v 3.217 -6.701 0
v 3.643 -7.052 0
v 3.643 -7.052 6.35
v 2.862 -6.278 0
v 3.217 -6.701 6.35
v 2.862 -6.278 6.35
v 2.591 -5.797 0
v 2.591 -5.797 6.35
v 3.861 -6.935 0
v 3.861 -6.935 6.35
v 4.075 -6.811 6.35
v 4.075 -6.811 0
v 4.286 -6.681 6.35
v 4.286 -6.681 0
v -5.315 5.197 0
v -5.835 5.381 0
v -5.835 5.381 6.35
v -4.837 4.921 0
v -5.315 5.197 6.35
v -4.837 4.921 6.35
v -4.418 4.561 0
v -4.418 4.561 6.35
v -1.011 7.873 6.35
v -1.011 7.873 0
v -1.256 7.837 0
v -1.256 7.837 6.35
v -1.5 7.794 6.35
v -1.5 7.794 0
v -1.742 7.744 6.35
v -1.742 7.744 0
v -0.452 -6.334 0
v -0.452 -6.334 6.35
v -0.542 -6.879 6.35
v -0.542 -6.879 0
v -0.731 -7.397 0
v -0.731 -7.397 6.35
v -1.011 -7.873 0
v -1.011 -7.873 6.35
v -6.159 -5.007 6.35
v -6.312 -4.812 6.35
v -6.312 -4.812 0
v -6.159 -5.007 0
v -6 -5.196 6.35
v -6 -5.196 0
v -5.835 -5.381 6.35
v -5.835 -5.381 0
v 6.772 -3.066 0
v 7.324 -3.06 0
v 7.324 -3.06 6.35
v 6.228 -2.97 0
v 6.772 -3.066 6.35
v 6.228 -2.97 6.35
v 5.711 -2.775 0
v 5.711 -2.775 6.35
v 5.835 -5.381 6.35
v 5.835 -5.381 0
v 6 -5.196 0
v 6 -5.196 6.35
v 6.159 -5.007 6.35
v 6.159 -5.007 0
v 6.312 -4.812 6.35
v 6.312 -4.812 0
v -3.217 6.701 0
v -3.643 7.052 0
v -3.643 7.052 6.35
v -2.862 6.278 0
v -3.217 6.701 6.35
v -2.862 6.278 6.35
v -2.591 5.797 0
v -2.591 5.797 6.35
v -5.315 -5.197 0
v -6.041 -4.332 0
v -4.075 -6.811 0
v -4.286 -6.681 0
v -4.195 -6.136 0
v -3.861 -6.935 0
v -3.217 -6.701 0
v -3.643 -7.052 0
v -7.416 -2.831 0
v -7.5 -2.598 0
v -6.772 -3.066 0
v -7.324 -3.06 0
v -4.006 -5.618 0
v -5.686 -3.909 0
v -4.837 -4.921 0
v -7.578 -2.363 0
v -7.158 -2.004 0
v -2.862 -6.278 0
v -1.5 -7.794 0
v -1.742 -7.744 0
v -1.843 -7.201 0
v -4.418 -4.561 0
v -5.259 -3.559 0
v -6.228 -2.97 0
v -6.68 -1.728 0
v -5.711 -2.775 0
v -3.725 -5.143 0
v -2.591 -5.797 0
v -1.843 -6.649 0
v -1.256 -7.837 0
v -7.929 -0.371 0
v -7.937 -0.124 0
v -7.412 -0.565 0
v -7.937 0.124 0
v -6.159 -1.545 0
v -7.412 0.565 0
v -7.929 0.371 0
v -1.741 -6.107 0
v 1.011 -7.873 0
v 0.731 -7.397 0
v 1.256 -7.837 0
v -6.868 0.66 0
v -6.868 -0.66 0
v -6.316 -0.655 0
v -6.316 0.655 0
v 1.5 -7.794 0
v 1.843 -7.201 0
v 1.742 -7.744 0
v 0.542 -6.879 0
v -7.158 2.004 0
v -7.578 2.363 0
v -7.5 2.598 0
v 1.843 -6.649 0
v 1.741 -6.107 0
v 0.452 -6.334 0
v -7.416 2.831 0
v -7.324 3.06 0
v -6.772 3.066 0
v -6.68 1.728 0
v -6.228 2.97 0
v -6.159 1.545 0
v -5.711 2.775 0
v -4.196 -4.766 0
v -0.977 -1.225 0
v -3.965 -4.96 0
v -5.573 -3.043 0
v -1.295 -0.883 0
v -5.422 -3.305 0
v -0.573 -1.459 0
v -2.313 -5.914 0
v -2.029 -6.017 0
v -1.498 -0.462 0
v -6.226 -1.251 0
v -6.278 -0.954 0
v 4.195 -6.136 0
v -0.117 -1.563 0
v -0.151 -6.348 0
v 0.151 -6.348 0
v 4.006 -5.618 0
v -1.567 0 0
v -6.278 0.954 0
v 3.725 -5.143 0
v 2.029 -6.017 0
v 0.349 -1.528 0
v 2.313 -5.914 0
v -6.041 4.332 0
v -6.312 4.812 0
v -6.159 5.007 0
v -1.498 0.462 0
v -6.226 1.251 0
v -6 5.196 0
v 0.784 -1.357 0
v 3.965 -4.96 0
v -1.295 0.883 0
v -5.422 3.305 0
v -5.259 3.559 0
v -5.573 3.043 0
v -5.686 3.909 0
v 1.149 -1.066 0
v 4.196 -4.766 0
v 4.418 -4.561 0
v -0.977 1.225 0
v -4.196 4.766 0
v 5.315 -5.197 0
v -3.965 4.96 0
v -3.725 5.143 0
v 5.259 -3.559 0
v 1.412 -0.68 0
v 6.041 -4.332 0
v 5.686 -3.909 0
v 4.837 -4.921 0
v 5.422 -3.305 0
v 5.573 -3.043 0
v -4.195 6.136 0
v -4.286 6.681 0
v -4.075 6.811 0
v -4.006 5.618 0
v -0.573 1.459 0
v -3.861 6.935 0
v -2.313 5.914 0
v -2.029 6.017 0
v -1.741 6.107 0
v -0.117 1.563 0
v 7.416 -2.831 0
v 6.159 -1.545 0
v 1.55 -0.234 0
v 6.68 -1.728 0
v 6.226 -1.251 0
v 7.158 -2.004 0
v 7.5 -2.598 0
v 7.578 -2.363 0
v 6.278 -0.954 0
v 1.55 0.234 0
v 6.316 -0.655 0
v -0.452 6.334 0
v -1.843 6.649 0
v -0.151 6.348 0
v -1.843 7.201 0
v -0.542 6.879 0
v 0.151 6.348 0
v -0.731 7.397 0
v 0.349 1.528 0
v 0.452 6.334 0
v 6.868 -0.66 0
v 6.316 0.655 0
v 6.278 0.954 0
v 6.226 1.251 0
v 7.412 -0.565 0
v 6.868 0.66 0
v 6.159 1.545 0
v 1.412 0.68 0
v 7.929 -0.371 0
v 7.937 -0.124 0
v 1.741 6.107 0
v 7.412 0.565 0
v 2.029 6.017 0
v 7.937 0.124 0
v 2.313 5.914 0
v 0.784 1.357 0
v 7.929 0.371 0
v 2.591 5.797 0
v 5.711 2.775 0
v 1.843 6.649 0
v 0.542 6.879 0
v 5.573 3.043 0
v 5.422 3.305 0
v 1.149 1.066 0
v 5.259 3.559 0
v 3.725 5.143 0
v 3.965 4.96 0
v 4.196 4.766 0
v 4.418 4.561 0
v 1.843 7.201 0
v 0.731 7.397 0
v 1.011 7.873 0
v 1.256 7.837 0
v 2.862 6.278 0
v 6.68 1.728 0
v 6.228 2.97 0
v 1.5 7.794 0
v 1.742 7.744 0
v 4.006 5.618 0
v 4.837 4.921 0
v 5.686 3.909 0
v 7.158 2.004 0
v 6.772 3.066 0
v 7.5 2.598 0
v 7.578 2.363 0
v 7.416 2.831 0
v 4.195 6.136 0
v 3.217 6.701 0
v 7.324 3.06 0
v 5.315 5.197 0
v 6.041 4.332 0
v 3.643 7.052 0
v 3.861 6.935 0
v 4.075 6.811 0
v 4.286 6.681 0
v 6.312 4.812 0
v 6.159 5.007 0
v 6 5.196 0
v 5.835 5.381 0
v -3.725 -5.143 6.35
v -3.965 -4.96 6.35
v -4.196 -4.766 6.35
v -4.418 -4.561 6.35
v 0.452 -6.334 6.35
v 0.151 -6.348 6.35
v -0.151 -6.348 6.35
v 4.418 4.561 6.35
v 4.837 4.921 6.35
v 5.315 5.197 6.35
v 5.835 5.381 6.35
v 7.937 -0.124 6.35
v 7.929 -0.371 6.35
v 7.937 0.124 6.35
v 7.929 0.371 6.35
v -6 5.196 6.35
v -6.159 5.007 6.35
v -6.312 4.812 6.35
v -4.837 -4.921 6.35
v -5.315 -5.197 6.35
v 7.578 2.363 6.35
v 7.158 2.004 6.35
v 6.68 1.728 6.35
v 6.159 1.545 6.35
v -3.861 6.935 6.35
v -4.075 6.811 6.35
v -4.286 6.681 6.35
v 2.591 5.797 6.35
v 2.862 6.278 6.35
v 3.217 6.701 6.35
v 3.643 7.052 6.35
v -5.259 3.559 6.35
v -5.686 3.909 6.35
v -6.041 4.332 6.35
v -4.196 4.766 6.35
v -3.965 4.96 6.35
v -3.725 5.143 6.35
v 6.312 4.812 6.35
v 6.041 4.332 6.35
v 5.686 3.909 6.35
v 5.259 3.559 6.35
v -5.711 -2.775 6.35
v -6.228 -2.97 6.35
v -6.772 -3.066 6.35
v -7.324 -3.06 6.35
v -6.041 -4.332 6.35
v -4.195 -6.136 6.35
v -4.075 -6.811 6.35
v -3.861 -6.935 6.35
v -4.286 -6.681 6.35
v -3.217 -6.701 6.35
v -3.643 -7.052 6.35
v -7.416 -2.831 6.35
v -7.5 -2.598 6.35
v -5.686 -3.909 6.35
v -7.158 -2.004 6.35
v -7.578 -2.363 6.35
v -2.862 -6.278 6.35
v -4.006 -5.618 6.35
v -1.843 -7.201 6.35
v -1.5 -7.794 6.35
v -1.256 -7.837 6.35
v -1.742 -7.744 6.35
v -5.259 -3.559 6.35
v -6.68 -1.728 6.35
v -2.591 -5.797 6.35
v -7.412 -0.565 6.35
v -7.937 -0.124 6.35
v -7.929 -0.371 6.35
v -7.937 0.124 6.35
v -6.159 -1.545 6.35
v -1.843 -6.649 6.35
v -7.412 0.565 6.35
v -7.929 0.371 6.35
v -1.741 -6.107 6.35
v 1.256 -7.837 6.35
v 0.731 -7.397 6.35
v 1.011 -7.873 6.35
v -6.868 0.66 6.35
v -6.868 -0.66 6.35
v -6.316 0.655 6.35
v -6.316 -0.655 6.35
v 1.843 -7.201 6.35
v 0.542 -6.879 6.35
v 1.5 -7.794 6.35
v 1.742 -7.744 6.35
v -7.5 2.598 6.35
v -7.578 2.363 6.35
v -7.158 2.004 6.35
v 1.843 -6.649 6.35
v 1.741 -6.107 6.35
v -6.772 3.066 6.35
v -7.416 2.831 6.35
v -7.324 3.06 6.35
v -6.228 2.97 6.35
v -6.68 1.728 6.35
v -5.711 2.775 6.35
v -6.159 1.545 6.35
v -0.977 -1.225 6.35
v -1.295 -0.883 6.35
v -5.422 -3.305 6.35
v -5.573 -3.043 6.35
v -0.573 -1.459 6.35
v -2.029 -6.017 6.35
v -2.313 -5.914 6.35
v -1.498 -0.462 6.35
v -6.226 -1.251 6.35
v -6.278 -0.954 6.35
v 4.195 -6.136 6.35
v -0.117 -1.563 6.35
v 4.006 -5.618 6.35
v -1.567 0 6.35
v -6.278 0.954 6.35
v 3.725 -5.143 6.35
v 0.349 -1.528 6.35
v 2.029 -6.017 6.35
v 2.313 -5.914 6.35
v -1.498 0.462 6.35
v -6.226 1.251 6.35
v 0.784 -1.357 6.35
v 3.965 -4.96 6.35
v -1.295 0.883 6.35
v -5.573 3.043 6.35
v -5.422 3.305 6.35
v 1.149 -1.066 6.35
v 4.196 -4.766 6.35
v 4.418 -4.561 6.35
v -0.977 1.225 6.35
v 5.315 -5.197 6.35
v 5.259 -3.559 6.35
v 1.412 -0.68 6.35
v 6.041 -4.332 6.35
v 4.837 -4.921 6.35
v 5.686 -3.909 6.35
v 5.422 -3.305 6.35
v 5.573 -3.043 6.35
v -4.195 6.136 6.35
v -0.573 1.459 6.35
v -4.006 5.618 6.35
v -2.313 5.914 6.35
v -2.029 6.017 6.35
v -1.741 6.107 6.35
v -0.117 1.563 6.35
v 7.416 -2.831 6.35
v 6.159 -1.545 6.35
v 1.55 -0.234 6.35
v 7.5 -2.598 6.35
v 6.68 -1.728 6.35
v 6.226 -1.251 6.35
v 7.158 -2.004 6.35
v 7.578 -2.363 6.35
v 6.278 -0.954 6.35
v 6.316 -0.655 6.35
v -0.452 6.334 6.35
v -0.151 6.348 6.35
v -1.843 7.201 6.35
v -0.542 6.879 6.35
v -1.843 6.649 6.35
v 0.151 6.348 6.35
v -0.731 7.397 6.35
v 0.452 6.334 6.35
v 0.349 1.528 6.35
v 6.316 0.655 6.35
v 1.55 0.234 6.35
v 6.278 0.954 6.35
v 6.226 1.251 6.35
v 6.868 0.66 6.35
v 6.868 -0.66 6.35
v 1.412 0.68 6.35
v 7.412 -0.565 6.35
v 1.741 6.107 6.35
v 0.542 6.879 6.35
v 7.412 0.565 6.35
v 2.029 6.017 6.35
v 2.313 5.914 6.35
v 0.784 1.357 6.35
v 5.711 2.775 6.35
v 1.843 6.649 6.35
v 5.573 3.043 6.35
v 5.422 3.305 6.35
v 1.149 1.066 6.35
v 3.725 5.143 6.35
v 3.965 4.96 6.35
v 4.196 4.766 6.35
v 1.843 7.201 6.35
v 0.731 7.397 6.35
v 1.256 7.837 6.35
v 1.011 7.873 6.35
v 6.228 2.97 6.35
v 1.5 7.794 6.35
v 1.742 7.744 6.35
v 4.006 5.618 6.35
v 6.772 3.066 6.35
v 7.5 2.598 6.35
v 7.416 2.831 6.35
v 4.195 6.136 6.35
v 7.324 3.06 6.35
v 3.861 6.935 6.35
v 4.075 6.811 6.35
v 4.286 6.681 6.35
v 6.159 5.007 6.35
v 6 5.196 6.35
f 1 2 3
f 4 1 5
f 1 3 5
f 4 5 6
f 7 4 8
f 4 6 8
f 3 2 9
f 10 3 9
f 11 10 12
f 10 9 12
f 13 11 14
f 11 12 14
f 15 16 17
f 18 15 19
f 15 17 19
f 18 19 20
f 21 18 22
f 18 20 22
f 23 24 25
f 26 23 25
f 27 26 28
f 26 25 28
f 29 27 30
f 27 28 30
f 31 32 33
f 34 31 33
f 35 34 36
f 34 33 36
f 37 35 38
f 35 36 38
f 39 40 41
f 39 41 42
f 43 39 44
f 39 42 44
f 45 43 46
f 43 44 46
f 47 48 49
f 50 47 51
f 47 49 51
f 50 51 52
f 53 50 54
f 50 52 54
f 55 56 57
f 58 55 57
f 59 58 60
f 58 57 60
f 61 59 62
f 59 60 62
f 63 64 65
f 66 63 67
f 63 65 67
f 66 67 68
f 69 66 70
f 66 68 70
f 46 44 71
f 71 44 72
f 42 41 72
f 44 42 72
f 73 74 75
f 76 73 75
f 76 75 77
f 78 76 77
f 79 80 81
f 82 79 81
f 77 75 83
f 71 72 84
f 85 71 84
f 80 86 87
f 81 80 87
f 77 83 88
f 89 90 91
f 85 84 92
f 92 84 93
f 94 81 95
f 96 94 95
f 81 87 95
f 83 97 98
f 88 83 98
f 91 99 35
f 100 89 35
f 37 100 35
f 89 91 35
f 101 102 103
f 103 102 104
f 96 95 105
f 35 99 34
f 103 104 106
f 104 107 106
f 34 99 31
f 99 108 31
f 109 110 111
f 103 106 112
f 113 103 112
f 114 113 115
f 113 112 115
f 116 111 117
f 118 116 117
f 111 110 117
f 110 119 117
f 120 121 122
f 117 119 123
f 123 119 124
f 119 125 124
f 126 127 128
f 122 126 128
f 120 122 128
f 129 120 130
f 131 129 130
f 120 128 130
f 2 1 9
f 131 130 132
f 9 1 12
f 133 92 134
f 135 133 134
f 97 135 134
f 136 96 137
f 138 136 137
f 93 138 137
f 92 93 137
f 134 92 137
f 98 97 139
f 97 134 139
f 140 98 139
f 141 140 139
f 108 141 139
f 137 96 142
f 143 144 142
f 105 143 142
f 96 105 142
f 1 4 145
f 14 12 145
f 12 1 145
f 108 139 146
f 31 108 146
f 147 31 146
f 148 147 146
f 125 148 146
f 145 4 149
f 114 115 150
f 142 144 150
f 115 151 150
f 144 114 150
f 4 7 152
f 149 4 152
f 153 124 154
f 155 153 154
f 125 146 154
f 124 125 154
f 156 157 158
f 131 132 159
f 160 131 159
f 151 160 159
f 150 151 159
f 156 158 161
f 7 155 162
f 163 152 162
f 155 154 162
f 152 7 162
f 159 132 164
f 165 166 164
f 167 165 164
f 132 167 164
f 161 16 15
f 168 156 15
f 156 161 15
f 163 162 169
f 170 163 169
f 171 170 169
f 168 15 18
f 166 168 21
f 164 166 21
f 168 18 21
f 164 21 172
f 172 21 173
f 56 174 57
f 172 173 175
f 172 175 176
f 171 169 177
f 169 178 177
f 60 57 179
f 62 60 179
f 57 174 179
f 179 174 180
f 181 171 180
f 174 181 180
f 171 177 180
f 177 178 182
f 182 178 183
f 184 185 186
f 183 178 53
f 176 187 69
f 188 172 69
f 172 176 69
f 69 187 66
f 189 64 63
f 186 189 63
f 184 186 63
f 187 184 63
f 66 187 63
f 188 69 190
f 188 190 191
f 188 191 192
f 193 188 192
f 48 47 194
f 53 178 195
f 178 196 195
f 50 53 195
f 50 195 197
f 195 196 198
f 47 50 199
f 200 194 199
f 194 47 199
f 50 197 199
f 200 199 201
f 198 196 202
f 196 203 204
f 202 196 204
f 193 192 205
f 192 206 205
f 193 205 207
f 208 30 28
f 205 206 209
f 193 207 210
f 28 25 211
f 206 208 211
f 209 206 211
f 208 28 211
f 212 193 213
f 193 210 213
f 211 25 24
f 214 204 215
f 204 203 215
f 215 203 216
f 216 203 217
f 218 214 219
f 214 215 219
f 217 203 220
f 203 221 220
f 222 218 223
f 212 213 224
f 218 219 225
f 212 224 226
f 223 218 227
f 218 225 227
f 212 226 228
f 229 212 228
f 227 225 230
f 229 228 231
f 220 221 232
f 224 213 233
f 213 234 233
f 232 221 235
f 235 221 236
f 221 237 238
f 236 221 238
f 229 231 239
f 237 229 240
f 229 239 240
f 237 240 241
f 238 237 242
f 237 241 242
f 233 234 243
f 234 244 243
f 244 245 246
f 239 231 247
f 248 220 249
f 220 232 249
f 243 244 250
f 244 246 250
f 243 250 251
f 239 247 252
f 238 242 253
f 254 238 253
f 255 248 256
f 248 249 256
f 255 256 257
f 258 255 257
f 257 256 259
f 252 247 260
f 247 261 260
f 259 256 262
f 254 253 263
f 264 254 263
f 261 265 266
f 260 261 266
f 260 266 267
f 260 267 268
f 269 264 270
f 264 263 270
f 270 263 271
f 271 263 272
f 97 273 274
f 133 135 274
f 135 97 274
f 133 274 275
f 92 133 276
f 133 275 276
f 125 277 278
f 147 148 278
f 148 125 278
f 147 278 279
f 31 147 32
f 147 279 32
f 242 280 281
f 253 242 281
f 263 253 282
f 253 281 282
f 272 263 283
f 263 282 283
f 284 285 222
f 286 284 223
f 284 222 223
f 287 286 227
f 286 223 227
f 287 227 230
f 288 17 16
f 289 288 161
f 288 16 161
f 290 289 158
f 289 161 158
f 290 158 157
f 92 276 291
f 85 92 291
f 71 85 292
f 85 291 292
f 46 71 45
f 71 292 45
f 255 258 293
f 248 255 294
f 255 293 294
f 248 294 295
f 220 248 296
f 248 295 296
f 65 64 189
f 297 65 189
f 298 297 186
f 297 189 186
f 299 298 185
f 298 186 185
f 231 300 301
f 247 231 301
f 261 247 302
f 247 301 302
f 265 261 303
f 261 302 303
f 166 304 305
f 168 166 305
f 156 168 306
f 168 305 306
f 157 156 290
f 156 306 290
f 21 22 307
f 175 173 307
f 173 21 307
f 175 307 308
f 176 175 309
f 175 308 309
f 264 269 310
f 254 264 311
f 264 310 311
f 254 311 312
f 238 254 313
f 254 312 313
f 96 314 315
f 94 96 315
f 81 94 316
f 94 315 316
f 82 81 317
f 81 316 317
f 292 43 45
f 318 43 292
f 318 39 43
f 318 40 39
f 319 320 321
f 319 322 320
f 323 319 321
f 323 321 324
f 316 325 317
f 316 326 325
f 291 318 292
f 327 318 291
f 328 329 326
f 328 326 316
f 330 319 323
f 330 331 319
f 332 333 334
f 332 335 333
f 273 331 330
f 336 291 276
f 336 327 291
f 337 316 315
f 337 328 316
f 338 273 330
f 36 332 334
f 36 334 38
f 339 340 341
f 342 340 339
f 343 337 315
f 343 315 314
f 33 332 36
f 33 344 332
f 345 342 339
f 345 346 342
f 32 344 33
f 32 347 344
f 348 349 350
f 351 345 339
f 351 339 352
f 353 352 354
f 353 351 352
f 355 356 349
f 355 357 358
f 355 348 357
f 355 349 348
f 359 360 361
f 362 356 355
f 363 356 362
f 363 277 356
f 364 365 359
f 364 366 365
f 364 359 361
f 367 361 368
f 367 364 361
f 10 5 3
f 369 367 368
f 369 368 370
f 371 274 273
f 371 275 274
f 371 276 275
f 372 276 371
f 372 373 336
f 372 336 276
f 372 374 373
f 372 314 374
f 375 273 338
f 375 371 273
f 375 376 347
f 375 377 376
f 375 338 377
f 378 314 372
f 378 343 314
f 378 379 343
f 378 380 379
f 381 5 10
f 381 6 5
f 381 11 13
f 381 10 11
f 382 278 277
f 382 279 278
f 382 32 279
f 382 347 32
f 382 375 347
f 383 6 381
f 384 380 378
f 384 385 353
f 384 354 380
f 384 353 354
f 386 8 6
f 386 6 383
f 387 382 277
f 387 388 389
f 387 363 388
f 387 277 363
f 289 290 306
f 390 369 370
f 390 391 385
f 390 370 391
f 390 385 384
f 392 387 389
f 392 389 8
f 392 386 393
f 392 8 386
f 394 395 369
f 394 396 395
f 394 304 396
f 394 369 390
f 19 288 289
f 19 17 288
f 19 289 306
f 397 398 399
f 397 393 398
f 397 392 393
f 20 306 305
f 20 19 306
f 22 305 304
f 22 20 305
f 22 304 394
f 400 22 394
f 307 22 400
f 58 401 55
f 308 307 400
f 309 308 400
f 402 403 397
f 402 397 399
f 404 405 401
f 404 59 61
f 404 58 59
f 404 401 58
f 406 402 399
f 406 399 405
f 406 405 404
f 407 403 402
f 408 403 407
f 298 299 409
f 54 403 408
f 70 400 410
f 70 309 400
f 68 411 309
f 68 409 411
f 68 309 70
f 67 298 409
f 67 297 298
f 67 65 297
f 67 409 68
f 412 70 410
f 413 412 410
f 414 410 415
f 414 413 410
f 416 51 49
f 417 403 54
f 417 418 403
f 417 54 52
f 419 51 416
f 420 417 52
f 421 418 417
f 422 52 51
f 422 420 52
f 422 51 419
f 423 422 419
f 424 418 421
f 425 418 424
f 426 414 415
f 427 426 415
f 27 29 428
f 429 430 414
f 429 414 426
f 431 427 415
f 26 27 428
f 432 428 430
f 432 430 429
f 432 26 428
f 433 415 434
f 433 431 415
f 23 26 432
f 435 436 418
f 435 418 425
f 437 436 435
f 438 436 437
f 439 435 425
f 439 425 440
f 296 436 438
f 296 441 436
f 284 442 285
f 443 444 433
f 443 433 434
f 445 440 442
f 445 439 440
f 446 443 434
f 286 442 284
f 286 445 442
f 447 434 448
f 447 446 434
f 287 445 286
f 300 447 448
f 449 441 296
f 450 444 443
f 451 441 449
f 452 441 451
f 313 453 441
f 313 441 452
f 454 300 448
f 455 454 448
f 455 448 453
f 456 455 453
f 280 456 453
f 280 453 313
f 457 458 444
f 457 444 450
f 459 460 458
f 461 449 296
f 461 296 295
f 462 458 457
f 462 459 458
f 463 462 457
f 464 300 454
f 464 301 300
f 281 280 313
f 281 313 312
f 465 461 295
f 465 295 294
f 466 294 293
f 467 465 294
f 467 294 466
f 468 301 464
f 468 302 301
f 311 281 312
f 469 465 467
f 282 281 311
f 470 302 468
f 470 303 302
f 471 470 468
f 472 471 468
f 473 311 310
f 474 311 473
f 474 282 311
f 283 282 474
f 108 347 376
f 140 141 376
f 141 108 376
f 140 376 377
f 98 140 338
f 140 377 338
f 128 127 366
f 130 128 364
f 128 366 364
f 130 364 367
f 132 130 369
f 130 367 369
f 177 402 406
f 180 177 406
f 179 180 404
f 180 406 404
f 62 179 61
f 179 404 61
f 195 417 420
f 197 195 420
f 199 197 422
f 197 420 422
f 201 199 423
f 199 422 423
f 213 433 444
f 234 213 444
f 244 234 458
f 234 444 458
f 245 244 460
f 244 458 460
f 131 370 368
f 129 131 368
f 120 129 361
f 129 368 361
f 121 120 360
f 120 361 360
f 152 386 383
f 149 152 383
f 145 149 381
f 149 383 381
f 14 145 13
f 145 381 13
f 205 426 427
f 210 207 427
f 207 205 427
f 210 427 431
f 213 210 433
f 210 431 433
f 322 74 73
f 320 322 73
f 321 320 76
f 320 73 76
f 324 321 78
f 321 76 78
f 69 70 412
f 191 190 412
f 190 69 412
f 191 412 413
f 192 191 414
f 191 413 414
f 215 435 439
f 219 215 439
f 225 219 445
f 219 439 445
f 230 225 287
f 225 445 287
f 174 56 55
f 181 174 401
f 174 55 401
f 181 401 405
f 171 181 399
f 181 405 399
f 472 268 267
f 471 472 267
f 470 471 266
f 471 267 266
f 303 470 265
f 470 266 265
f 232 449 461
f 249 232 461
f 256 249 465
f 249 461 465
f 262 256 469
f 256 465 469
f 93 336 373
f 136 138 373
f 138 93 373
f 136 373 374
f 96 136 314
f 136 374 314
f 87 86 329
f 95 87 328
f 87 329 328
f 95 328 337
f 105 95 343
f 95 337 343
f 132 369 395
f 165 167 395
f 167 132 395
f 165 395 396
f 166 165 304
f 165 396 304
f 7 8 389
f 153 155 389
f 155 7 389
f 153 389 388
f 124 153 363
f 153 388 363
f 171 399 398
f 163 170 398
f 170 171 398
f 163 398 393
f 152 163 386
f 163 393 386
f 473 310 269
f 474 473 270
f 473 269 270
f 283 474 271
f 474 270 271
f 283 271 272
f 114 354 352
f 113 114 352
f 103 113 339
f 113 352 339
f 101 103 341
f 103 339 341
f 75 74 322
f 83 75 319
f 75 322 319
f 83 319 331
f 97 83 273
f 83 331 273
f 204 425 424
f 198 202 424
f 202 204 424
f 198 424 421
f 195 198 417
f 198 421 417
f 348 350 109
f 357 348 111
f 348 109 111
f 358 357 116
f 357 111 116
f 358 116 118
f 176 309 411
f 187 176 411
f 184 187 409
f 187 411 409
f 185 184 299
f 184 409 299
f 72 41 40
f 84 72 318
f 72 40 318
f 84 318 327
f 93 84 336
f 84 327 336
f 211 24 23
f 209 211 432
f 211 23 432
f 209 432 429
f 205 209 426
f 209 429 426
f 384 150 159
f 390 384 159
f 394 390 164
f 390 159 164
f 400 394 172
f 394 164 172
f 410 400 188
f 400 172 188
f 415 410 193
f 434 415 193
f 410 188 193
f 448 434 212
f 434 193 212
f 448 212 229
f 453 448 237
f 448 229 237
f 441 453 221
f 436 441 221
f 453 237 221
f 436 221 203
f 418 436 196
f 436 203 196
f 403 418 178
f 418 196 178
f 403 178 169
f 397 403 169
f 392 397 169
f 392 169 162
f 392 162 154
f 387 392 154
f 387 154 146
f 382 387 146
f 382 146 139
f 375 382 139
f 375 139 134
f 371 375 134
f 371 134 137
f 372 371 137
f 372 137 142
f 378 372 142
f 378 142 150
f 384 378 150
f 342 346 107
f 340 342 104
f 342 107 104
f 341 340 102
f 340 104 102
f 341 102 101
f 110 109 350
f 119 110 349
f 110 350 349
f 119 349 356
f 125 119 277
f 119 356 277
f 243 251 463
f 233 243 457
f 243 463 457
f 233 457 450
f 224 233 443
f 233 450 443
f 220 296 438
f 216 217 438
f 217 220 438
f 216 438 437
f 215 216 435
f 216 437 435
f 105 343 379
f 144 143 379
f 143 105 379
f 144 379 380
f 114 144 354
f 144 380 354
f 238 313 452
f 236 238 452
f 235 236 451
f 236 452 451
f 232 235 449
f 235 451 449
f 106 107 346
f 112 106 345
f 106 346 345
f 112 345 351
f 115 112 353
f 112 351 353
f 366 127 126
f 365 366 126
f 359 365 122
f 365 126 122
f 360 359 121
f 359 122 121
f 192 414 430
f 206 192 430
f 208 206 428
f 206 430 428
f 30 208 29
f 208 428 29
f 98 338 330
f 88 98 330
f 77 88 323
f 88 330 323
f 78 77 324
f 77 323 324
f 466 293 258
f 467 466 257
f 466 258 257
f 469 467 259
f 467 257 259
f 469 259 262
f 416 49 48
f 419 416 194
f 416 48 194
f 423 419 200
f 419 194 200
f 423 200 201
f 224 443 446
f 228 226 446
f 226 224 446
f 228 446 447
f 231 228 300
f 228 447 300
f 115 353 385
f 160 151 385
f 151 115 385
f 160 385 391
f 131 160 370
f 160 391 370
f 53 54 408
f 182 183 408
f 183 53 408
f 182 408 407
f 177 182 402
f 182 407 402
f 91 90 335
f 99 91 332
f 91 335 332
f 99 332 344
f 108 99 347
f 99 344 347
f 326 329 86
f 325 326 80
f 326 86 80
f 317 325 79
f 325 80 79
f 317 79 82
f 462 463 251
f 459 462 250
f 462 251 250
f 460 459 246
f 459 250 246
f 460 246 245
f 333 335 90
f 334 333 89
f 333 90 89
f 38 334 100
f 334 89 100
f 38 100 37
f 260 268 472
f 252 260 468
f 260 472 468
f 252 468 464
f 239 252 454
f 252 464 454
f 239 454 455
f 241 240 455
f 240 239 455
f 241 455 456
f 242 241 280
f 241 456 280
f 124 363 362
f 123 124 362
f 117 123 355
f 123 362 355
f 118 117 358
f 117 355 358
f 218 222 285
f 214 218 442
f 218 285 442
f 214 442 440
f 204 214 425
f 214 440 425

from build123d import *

# Parameters (mm, degrees)
SKETCH1_R           = 7.9375
OUTER_CIRCLE_DEPTH  = 6.35
TOOTH_CUT_DEPTH     = 13.896910967
TEETH_PATTERN_COUNT = 18
SKETCH3_R           = 1.56718
CUT_EXTRUDE1_DEPTH  = 13.857185215


with BuildPart() as part:
    # Sketch1 → Outer Circle (new body)
    with BuildSketch(Plane.XY):
        Circle(SKETCH1_R)
    extrude(amount=OUTER_CIRCLE_DEPTH)

    # Sketch2 → Tooth Cut (cut, through all)
    with BuildSketch(Plane.XY.offset(6.35)):
        with BuildLine():
            ThreePointArc((-0.452232993, 6.333876011), (0, 6.35), (0.452232993, 6.333876011))
            ThreePointArc((0.452232993, 6.333876011), (0.624488533, 7.142351531), (1.011484471, 7.872788922))
            ThreePointArc((1.011484471, 7.872788922), (0, 7.9375), (-1.011484471, 7.872788922))
            ThreePointArc((-1.011484471, 7.872788922), (-0.624488533, 7.142351531), (-0.452232993, 6.333876011))
        make_face()
    tooth_cut = extrude(amount=-TOOTH_CUT_DEPTH, mode=Mode.SUBTRACT)

    # Teeth Pattern: Tooth Cut ×18 about axis
    teeth_pattern_axis = Axis((0, 0, 0), (0, 0, 1))
    for i in range(1, TEETH_PATTERN_COUNT):
        add(tooth_cut.rotate(teeth_pattern_axis, i * 360 / TEETH_PATTERN_COUNT), mode=Mode.SUBTRACT)

    # Sketch3 → Cut-Extrude1 (cut, through all)
    with BuildSketch(Plane(origin=(0, 0, 0), x_dir=(-1, 0, 0), z_dir=(0, 0, -1))):
        Circle(SKETCH3_R)
    extrude(amount=-CUT_EXTRUDE1_DEPTH, mode=Mode.SUBTRACT)


solid = part.part
